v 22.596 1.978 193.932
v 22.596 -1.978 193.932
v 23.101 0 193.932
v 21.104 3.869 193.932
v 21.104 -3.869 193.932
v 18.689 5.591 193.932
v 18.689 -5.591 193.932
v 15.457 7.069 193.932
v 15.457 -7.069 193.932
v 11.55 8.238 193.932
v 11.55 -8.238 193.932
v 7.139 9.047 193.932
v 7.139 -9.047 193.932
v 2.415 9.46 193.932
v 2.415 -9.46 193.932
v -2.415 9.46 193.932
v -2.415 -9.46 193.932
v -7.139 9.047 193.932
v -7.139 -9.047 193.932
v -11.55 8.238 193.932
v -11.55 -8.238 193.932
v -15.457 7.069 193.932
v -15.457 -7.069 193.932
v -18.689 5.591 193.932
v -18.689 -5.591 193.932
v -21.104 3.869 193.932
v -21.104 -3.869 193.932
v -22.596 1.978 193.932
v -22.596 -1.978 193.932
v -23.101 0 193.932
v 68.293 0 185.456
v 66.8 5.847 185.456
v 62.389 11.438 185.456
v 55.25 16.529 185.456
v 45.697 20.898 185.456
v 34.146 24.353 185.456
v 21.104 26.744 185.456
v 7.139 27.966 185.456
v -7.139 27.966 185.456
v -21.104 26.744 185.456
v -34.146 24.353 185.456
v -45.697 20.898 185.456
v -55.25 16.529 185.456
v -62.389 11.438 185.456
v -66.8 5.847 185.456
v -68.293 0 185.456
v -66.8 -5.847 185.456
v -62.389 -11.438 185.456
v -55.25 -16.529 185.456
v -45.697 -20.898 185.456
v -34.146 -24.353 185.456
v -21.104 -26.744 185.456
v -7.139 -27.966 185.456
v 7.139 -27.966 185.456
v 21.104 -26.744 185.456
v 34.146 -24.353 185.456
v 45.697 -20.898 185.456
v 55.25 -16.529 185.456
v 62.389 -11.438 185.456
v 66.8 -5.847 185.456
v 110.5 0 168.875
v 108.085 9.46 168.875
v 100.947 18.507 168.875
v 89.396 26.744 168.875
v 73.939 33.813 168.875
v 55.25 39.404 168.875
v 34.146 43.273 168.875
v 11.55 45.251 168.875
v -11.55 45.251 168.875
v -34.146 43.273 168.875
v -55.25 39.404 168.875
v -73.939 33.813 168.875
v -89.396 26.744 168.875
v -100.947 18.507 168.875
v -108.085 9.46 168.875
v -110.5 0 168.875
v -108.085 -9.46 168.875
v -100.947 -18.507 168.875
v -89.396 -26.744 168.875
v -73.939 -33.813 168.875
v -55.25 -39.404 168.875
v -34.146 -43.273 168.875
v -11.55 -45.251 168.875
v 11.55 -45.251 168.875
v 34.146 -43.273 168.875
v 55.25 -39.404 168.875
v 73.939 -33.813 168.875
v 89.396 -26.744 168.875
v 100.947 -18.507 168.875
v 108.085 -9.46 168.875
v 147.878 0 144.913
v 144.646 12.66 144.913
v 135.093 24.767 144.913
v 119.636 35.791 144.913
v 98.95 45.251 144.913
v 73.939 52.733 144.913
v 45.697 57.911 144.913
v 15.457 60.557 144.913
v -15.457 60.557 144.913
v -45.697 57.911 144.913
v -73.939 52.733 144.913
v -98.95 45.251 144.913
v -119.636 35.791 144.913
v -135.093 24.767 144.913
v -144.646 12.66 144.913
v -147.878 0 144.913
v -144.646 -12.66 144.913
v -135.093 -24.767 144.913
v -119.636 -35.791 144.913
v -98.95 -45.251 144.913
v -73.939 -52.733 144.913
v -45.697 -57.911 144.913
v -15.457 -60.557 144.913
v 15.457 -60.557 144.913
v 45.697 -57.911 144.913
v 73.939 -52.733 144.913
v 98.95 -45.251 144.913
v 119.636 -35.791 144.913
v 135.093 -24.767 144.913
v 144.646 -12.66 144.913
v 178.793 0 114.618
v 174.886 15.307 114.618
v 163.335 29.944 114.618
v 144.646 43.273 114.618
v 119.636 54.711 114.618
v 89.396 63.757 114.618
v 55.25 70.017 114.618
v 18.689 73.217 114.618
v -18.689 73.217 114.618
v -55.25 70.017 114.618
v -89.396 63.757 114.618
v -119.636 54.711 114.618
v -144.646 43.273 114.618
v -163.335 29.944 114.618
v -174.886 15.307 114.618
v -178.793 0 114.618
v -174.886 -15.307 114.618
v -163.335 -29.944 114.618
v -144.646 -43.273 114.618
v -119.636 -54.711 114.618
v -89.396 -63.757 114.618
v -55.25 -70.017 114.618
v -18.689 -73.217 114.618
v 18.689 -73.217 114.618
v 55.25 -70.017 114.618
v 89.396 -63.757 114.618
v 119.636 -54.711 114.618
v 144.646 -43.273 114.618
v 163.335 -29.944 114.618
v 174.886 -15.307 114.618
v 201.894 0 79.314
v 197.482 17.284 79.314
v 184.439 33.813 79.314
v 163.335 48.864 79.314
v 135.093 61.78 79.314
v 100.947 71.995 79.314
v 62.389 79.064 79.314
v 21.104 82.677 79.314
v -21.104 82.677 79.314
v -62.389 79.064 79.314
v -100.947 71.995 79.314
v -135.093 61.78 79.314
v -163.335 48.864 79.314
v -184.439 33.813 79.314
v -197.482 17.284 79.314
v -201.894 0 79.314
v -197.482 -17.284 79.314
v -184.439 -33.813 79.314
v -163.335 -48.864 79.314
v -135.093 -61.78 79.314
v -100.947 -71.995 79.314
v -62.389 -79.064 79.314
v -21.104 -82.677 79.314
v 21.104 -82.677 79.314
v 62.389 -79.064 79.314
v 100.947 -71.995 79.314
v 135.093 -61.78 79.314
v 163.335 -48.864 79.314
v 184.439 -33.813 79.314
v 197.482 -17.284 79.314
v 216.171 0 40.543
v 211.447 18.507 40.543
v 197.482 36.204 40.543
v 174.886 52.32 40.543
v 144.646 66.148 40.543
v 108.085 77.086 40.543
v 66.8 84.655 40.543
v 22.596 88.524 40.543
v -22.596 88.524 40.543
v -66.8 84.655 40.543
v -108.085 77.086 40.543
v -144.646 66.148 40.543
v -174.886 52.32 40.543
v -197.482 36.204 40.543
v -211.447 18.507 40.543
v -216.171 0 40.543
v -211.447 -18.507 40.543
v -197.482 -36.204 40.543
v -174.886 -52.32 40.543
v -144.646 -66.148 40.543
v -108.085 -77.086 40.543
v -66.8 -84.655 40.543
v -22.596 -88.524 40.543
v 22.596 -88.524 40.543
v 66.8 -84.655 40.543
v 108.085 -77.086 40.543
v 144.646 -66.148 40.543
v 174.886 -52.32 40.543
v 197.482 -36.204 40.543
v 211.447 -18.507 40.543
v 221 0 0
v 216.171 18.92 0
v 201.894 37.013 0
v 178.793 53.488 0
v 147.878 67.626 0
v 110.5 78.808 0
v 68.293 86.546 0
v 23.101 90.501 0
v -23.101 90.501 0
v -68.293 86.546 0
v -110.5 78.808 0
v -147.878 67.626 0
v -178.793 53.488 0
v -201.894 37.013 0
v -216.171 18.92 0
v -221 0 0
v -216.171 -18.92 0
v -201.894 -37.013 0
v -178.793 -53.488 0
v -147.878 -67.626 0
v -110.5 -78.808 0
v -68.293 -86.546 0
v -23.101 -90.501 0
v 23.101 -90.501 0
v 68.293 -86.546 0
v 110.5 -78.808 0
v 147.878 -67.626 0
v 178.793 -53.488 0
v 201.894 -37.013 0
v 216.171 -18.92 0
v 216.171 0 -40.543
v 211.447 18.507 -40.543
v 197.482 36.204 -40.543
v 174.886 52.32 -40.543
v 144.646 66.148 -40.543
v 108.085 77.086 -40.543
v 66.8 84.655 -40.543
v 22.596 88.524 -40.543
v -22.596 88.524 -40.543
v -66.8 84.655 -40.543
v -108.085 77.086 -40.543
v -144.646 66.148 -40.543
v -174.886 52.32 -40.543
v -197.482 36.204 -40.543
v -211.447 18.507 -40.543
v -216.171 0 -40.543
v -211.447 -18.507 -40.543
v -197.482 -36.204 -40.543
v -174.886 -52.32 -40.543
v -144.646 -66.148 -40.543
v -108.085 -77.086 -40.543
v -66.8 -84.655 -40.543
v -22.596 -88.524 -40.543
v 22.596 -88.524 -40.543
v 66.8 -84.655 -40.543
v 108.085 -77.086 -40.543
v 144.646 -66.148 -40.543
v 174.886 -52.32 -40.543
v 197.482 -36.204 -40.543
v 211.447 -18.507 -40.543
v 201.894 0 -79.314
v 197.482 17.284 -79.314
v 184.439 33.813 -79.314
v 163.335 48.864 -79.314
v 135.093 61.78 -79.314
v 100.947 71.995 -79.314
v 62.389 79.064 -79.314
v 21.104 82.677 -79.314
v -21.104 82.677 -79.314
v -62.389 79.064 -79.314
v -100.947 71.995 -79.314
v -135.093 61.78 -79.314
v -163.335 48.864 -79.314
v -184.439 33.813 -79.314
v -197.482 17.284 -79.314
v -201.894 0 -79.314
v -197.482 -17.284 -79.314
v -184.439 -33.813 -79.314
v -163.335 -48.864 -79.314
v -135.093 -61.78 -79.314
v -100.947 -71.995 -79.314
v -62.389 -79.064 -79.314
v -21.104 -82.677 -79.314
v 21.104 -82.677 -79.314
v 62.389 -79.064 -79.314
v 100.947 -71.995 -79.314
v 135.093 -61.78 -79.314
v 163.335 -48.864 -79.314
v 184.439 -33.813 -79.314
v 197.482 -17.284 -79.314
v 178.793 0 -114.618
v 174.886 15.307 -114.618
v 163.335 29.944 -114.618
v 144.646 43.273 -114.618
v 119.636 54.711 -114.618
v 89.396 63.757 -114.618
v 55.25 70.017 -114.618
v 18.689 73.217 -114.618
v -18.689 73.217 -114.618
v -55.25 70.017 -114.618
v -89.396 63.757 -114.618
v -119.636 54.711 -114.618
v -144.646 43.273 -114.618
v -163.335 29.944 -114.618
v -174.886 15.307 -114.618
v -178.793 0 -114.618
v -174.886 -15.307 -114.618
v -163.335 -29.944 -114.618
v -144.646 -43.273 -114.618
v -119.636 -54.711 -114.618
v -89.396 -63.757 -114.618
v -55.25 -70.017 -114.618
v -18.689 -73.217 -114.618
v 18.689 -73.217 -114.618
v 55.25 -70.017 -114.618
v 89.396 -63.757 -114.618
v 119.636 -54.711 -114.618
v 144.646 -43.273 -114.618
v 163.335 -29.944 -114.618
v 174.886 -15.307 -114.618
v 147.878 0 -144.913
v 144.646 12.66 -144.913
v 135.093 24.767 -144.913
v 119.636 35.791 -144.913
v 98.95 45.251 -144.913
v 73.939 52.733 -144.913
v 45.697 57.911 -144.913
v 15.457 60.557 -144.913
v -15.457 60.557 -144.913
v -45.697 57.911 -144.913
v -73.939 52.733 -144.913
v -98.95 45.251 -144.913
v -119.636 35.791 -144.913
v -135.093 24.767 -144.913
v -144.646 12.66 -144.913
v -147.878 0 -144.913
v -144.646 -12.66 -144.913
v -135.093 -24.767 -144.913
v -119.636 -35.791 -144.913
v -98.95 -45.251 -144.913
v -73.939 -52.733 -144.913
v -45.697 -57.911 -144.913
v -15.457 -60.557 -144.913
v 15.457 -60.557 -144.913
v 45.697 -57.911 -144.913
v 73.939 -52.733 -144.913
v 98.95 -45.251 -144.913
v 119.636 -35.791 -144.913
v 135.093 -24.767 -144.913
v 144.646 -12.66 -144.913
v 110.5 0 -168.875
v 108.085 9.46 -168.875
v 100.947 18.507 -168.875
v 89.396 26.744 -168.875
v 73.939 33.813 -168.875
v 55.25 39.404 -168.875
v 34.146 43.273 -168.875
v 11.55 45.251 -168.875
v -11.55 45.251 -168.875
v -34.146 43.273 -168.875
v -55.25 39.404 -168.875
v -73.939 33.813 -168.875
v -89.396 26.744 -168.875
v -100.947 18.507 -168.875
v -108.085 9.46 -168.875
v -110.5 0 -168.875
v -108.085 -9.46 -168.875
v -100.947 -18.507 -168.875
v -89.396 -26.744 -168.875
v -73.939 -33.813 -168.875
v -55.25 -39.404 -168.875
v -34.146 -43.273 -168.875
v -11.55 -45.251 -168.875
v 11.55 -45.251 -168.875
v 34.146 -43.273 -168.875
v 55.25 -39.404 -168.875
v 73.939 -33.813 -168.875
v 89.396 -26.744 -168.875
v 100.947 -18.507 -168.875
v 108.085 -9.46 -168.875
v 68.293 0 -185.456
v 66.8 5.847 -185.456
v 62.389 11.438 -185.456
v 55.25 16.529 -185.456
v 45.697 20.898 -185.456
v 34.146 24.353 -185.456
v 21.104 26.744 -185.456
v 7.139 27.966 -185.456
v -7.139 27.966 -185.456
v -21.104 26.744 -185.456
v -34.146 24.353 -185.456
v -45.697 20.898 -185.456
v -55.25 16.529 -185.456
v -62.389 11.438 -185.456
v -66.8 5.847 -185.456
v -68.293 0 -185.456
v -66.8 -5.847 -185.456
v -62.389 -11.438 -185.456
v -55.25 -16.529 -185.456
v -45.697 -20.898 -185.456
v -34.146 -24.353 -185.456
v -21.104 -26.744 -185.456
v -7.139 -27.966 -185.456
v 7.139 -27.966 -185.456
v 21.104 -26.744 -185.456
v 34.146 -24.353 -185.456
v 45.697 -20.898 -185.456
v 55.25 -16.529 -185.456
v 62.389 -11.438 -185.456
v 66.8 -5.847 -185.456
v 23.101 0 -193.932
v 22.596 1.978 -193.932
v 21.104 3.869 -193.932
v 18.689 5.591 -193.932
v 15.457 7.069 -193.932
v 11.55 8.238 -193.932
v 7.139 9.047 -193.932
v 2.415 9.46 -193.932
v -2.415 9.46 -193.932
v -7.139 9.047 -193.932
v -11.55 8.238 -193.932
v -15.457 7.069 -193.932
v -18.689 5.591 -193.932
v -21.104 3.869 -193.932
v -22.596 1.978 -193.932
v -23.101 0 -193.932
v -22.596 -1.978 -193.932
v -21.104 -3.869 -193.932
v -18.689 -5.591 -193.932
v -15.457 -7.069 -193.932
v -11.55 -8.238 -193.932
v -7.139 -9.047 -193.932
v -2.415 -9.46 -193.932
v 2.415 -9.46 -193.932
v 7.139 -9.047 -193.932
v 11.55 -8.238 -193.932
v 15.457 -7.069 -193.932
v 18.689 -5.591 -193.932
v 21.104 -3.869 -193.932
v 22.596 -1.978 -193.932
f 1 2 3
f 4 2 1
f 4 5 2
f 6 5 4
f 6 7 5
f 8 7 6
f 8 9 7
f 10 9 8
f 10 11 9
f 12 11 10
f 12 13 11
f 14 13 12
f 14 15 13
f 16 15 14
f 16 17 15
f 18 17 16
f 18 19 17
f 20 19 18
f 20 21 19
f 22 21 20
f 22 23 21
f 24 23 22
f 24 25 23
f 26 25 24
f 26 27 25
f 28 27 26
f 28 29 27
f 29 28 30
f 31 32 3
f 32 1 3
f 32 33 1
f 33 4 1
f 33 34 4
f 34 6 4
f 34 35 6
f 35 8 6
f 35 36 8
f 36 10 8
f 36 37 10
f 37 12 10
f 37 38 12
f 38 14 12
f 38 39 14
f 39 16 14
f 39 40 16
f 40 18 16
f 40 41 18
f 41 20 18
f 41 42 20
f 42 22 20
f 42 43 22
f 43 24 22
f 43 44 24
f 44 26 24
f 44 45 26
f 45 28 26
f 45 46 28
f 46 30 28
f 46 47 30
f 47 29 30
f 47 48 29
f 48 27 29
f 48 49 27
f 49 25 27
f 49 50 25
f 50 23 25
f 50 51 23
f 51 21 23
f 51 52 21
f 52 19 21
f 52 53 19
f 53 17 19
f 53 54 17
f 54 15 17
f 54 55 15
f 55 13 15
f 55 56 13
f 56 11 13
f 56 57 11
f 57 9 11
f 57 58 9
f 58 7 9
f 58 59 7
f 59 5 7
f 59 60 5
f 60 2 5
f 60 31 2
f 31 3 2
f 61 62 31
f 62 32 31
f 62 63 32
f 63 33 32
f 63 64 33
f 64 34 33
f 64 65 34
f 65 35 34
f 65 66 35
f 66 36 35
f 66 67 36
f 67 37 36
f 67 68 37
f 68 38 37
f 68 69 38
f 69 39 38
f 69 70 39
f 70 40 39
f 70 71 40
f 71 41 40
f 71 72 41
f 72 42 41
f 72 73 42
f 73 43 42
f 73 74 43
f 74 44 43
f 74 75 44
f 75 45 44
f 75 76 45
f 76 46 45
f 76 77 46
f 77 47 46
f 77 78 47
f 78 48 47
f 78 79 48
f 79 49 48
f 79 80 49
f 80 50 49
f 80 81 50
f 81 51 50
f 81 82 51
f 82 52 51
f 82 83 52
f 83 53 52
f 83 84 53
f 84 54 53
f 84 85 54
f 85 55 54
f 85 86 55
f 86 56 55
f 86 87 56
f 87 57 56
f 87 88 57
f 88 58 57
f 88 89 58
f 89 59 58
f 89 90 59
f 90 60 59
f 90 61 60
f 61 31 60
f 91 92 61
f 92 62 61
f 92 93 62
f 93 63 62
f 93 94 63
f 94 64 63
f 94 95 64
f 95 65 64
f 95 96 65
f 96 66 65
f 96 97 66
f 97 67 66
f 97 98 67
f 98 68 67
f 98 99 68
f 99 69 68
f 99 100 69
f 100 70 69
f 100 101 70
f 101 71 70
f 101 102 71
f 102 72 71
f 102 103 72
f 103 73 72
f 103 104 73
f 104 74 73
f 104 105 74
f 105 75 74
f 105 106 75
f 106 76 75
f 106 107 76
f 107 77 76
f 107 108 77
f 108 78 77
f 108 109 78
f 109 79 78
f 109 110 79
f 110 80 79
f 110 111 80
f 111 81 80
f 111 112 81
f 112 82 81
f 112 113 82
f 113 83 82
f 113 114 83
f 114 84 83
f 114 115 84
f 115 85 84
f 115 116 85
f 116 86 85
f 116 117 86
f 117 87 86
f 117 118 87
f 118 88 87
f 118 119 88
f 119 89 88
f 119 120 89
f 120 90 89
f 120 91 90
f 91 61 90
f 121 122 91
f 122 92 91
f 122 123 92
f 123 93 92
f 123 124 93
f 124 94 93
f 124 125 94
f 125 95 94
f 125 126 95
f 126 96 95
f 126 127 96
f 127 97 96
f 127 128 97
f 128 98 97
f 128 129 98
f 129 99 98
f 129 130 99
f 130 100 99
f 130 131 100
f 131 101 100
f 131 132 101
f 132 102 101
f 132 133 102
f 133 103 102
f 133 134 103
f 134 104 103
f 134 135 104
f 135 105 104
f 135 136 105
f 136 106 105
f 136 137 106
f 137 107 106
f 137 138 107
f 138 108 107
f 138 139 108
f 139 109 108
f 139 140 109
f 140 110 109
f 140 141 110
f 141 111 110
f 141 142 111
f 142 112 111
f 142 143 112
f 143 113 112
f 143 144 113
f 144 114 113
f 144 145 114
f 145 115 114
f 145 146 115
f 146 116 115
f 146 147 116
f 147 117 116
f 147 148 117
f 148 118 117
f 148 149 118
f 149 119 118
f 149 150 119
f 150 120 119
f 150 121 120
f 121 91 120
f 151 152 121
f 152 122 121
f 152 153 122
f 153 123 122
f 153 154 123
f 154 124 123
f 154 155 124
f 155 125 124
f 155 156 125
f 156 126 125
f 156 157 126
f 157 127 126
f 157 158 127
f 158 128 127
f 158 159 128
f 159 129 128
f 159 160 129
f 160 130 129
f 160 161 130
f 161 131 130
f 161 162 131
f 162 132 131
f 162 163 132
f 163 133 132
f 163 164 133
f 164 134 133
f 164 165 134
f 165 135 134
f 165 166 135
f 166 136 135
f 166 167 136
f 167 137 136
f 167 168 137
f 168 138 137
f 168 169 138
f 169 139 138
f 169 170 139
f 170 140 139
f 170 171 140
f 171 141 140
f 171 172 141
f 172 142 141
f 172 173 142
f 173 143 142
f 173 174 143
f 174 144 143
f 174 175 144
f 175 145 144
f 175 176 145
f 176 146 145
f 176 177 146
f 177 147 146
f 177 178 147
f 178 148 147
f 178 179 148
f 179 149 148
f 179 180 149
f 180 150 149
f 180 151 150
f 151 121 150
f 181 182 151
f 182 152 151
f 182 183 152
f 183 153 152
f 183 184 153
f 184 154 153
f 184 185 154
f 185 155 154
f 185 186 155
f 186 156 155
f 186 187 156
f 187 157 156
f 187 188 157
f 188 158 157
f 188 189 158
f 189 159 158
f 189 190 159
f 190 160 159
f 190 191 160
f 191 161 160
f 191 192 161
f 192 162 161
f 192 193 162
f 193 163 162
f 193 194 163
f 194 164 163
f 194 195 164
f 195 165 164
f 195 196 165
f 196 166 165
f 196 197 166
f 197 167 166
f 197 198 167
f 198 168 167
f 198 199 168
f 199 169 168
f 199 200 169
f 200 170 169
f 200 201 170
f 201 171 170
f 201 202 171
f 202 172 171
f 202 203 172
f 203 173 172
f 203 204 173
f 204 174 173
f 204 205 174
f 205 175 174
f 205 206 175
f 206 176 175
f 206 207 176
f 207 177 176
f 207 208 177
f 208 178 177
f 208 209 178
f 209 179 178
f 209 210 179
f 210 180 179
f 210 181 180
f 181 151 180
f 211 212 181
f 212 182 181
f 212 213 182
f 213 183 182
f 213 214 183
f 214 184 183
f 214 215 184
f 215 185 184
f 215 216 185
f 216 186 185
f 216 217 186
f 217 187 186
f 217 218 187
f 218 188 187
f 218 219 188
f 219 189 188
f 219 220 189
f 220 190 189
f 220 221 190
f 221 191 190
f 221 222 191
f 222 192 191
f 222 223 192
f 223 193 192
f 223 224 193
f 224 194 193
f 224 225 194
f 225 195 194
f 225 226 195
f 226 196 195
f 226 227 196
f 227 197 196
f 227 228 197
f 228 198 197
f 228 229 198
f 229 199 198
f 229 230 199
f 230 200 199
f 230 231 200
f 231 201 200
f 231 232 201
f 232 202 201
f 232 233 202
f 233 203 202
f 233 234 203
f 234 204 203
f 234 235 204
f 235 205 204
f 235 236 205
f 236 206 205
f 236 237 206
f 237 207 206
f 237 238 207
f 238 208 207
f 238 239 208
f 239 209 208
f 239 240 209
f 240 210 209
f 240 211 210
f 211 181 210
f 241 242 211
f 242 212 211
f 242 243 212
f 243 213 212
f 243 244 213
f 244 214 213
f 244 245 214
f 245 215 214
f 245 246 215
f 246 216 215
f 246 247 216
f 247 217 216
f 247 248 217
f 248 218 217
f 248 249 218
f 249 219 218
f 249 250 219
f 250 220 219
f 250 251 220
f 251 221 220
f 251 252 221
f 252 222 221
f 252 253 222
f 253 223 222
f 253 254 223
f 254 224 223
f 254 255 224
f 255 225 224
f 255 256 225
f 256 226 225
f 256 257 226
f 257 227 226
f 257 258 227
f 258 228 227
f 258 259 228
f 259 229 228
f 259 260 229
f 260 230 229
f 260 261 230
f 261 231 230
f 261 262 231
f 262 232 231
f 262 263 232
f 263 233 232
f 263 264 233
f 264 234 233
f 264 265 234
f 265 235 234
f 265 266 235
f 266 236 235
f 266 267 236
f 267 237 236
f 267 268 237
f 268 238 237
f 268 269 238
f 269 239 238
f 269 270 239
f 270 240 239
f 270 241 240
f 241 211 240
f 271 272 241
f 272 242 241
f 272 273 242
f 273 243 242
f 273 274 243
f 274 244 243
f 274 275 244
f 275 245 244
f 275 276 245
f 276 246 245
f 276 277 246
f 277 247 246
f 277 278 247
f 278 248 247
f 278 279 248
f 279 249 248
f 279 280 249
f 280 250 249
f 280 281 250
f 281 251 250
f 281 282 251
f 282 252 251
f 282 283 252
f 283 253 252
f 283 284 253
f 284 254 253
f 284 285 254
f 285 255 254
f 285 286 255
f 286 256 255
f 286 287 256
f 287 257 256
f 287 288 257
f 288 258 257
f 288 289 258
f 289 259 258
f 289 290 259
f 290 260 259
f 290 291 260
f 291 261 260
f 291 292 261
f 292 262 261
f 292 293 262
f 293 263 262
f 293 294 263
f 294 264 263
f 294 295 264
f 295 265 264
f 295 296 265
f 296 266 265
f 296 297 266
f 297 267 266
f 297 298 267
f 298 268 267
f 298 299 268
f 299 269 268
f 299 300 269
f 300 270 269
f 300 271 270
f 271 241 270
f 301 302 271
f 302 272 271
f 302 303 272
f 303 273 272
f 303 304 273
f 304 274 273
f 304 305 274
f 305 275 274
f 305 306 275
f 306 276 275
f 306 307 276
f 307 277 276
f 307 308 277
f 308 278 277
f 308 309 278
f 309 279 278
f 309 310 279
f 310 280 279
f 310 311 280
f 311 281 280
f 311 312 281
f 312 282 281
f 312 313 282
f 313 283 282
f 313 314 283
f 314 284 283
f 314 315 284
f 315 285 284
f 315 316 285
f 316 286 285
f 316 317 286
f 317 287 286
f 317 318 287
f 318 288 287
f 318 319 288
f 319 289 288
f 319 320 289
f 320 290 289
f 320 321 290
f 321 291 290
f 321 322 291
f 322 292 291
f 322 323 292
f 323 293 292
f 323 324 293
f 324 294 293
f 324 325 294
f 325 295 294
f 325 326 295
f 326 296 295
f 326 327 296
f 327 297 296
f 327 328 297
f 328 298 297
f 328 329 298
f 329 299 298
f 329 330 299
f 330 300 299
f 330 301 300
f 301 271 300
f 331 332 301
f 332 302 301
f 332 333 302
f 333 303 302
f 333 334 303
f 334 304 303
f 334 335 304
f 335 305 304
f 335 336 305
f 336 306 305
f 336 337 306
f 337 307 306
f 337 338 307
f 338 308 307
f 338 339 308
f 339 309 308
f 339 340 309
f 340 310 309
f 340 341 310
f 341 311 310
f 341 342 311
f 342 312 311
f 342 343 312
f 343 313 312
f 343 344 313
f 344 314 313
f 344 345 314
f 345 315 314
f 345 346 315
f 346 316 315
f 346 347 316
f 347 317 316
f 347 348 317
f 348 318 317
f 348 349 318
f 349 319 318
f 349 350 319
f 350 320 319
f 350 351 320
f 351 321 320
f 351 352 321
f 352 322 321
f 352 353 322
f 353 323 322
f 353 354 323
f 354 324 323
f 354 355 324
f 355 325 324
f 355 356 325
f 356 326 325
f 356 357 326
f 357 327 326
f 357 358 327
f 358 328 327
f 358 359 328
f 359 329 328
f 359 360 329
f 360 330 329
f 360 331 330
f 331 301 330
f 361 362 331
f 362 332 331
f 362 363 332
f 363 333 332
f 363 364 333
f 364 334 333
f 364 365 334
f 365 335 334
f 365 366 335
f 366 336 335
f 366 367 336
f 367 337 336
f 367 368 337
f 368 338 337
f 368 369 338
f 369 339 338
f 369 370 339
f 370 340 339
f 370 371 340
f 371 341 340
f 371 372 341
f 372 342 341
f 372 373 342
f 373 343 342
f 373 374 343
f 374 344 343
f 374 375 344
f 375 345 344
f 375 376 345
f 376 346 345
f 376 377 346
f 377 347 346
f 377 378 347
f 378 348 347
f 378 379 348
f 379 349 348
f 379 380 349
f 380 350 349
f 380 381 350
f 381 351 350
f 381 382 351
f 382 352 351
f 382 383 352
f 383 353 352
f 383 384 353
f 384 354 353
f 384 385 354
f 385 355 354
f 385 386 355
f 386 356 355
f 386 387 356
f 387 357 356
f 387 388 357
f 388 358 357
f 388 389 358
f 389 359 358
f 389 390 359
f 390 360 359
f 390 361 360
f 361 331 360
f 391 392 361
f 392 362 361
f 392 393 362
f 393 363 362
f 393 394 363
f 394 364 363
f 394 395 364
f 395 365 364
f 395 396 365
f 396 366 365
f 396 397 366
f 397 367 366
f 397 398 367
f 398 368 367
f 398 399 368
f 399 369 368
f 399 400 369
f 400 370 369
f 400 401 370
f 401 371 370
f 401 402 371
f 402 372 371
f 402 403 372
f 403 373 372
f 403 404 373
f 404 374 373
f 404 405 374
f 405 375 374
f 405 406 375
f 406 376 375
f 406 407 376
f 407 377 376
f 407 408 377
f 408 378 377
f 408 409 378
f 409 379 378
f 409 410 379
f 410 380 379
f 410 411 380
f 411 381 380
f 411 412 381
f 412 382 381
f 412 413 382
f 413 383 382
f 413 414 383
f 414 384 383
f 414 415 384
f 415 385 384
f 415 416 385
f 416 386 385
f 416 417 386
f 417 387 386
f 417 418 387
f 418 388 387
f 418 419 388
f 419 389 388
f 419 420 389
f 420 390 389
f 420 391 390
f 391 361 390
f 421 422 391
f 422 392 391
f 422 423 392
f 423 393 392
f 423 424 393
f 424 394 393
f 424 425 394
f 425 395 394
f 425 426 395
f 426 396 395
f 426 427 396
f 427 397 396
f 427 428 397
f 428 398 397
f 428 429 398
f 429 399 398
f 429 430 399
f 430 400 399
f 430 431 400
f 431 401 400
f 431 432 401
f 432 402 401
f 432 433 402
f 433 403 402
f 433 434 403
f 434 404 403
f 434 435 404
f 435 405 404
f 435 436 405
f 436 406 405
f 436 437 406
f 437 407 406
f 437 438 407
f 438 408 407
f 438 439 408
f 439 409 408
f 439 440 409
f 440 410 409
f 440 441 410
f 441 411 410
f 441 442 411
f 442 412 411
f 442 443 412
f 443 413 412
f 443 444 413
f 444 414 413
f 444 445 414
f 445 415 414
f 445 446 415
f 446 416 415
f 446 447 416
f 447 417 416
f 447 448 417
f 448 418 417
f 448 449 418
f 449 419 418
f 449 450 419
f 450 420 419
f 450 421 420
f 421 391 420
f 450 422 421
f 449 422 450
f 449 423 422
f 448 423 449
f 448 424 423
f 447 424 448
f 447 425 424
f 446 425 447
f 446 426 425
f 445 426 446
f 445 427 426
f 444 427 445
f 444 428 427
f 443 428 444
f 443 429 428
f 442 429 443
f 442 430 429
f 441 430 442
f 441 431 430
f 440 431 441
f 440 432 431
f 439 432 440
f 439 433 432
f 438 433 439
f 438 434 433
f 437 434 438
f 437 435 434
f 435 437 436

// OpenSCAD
// Generated by SolidPython 1.0.1 on 2020-07-29 00:46:52


scale(v = [17, 7, 15]) {
	sphere(r = 13);
}
/***********************************************
*********      SolidPython code:      **********
************************************************
 
# import packages: SolidPython
from solid import *
from solid.utils import *
from itertools import chain, combinations, permutations


class Resize:

    def __init__(self, scad_file):
        self.scad_file = scad_file
        #self.scad_file = import_scad(scad_file)
        # cone/cylinder param:
        self.r1 = 0
        self.r2 = 0
        self.h = 0
        # rectangular prism param:
        self.w = 0
        self.l = 0
        # ellipse param:
        self.r = 0

    # import OpenScad code (file name corresponds to shape)


    # classify shape + parameters
    def assign(self, param1, param2, param3):
        if self.scad_file == 'cone.scad':
            self.r1 = param1
            self.r2 = param2
            self.h = param3
        elif self.scad_file == 'cylinder.scad':
            self.r1 = param1
            self.r2 = param2
            self.h = param3
        elif self.scad_file == 'rectangularPrism.scad':
            self.h = param1
            self.l = param2
            self.w = param3
        else:
            self.r = param1
            self.h = param2

    # resize parameters
    def iterate(self):
        x = range(3, 20, 2)
        i = 1
        if self.scad_file == 'cone.scad':
            tempList = list(permutations(x, 2))
            for temp in tempList:
                param1 = temp[0]
                param2 = temp[1]
                filepath = 'produced_scad_files/' + 'cone' + str(param1) + '_' + str(param2) + '_' + '.scad'
                scad_render_to_file(cylinder(h=param1, r1=param2, r2=0), filepath)

        elif self.scad_file == 'cylinder.scad':
            tempList = list(permutations(x, 3))
            for temp in tempList:
                param1 = temp[0]
                param2 = temp[1]
                filepath = 'produced_scad_files/' + 'cylinder' + str(param1) + '_' + str(param2) + '_' + '.scad'
                scad_render_to_file(cylinder(h=param1, r1=param2, r2=param2), filepath)

        elif self.scad_file == 'rectangularPrism.scad':
            tempList = list(permutations(x, 3))
            for temp in tempList:
                param1 = temp[0]
                param2 = temp[1]
                param3 = temp[2]
                filepath = 'produced_scad_files/' + 'rectangularPrism' + str(param1) + '_' + str(param2) + '_' + str(
                    param3) + '.scad'
                scad_render_to_file(cube(size=(param1, param2, param3)), filepath)

        elif self.scad_file == 'ellipse.scad':
            tempList = list(permutations(x, 4))
            for temp in tempList:
                param1 = temp[0]
                param2 = temp[1]
                param3 = temp[2]
                param4 = temp[3]
                filepath = 'produced_scad_files/' + 'ellipse' + str(param1) + '_' + str(param2) + '_' + str(param3) + '_' + str(param4) + '.scad'
                scad_render_to_file(scale([param1, param2, param3])(sphere(r=param4)), filepath)

    def render_to_scadfile(self):
        scad_render_to_file(scad, 'example.scad') 
 
************************************************/
